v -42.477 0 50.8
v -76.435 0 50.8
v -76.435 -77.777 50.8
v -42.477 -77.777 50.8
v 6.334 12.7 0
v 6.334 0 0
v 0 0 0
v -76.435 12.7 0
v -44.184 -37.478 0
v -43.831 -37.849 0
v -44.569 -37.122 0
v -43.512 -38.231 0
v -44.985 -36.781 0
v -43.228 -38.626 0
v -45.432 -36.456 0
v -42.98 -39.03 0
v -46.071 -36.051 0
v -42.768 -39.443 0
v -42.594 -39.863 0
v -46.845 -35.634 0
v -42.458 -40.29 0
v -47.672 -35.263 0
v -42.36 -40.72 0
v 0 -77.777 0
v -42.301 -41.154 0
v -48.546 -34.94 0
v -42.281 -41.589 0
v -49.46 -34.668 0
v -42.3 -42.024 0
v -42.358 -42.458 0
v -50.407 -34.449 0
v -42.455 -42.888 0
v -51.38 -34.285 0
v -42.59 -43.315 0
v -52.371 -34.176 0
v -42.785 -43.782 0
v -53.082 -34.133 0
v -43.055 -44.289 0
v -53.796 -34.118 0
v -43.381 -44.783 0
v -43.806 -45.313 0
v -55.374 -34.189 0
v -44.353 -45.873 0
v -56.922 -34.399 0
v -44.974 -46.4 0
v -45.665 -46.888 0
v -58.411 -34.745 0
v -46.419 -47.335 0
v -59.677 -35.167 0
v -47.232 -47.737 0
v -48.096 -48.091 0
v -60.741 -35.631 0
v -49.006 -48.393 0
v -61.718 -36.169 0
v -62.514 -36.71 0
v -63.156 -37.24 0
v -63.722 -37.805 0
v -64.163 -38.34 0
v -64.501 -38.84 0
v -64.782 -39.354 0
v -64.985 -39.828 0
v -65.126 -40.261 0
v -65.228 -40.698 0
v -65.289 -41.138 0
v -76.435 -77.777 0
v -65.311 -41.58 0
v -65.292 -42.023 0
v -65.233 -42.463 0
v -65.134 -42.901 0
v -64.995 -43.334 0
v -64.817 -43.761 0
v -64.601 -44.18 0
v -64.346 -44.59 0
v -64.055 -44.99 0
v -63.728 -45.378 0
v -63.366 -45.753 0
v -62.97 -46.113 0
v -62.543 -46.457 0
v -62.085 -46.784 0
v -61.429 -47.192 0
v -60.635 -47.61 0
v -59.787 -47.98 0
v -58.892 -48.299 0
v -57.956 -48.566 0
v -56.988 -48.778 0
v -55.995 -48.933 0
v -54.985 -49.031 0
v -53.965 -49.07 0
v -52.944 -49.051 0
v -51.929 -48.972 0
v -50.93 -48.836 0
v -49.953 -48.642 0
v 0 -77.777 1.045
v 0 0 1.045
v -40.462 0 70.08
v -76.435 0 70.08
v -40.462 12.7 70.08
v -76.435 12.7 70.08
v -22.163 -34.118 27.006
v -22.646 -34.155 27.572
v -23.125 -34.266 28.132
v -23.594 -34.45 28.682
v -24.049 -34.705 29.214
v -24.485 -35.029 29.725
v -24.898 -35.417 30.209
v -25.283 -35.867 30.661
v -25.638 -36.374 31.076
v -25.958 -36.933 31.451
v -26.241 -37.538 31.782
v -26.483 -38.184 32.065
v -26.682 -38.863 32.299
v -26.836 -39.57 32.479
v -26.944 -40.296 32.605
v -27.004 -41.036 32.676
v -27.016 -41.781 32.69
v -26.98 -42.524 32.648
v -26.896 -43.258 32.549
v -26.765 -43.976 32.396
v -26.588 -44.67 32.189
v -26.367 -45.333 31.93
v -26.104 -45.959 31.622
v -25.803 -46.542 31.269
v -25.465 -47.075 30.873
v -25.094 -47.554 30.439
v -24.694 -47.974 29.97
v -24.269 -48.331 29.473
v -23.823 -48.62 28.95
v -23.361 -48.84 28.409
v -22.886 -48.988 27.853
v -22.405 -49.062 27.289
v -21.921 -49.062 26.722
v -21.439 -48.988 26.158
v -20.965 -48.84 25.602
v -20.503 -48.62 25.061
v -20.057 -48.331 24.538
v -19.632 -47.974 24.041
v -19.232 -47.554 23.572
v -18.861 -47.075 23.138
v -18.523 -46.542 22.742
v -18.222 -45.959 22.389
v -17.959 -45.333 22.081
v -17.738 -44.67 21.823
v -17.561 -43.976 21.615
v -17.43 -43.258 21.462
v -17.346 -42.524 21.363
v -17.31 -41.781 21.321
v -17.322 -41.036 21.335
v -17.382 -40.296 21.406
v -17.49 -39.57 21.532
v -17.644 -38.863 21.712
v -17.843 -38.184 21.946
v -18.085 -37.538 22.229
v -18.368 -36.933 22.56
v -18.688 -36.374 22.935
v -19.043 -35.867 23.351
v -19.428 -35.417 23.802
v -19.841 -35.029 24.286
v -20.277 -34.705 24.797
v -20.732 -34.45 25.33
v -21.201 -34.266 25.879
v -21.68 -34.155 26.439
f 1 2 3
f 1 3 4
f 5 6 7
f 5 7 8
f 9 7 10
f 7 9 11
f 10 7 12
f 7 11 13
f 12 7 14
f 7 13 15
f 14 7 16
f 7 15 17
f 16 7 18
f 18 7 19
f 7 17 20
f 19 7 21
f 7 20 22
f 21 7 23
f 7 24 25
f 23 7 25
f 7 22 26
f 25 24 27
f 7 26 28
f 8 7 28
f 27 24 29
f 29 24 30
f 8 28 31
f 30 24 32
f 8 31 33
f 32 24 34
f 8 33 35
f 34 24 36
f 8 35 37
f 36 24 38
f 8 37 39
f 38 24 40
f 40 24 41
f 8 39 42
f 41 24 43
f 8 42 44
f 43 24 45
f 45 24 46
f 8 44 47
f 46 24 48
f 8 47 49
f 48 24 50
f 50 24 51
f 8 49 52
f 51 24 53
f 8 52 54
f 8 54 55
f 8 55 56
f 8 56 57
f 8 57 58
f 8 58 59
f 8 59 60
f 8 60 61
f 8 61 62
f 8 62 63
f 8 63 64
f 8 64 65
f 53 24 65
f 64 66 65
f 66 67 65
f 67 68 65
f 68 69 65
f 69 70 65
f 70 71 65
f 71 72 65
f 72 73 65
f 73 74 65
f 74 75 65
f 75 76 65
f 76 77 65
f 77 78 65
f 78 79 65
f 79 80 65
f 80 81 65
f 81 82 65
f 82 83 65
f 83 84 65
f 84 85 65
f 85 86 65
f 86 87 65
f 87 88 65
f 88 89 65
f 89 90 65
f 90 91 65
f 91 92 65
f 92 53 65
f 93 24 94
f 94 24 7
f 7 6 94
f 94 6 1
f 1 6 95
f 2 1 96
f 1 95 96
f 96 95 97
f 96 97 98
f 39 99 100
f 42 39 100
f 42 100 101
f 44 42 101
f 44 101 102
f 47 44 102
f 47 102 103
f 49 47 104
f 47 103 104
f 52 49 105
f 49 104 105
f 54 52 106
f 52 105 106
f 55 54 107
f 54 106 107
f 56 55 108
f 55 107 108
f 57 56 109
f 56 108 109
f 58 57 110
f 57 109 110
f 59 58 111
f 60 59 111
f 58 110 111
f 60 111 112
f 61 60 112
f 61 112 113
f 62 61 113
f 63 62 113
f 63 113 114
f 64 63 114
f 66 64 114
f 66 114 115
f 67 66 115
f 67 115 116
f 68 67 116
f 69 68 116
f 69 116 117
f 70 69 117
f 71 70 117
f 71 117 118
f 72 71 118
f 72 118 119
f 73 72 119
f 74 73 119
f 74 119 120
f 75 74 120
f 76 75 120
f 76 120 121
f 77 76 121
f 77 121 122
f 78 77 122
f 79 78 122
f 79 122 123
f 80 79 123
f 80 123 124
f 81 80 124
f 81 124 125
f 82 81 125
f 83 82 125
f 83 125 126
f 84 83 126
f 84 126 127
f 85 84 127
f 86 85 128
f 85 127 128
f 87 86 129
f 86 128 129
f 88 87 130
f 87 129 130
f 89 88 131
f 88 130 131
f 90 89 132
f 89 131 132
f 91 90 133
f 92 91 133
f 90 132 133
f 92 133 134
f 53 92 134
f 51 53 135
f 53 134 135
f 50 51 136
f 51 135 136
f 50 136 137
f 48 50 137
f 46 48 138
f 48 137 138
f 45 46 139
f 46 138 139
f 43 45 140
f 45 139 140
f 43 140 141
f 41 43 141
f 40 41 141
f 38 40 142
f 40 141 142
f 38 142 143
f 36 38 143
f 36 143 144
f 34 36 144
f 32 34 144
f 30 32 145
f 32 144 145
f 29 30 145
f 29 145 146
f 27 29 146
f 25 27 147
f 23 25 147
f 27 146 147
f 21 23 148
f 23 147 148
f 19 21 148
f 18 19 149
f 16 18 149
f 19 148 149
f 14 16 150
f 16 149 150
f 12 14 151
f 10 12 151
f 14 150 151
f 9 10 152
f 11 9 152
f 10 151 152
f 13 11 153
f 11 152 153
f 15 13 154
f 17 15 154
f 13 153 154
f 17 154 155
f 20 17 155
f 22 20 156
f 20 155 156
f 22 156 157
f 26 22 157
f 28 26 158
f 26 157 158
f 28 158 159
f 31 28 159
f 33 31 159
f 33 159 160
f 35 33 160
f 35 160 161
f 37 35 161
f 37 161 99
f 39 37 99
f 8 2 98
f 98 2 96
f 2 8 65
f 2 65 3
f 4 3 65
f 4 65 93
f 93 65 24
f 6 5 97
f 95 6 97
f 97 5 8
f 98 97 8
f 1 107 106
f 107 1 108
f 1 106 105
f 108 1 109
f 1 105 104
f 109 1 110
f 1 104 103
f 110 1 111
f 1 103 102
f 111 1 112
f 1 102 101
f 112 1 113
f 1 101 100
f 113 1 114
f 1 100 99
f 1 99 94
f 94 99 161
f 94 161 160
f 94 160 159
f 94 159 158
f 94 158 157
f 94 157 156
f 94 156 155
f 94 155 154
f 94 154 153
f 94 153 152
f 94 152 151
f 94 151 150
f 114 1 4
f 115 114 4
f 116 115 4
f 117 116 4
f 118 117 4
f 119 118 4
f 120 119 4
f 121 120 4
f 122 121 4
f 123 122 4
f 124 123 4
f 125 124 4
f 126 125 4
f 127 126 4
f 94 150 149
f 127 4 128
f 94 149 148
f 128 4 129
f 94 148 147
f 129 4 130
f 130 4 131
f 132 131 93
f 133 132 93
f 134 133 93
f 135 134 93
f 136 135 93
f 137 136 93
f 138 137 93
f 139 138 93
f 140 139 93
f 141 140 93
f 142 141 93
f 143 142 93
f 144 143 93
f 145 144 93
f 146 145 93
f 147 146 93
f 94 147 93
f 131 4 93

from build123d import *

# Parameters (mm, degrees)
F0_W     = 76.4351114631
F0_H     = 77.7774527669
F1_DEPTH = 50.8
F3_DEPTH = 77.7784527669
F4_R     = 7.4764365624
F5_DEPTH = 58.8116741145
F6_W     = 82.7689305879
F6_H     = 70.0802728534
F7_DEPTH = 12.7
F9_DEPTH = 90.4784527669


with BuildPart() as f1:
    # F0 (on Top) → F1 (new body)
    with BuildSketch(Plane.XY):
        with Locations((-38.2175557315, -38.8887263834)):
            Rectangle(F0_W, F0_H)
    extrude(amount=F1_DEPTH)

    # F2 (on face) → F3 (cut, through all)
    with BuildSketch(Plane.XZ.offset(77.7774527669)):
        Polygon((15.4465576634, -17.0485954732), (15.4465576634, 50.8), (-42.4766093493, 50.8), align=None)
    extrude(amount=-F3_DEPTH, mode=Mode.SUBTRACT)

    # F4 (on face) → F5 (cut, through all)
    with BuildSketch(Plane(origin=(0.5159375483, 0, 0.4404621285), x_dir=(0, 1, 0), z_dir=(0.760544385, 0, 0.6492859451))):
        with Locations((-41.5946096182, 34.9290184677)):
            Circle(F4_R)
    extrude(amount=-F5_DEPTH, mode=Mode.SUBTRACT)

    # F6 (on face) → F7 (join)
    with BuildSketch(Plane(origin=(0, 0, 0), x_dir=(-1, 0, 0), z_dir=(0, 1, 0))):
        with Locations((35.0506461691, 35.0401364267)):
            Rectangle(F6_W, F6_H)
    extrude(amount=F7_DEPTH)

    # F8 (on face) → F9 (cut, through all)
    with BuildSketch(Plane(origin=(0, 12.7, 0), x_dir=(-1, 0, 0), z_dir=(0, 1, 0))):
        Polygon((40.4624007642, 70.0802728534), (-6.3338191248, 70.0802728534), (-6.3338191248, 35.0401364267), align=None)
        Polygon((-6.3338191248, 0), (40.4624007642, 70.0802728534), (-6.3338191248, 35.0401364267), align=None)
    extrude(amount=-F9_DEPTH, mode=Mode.SUBTRACT)


solid = f1.part
